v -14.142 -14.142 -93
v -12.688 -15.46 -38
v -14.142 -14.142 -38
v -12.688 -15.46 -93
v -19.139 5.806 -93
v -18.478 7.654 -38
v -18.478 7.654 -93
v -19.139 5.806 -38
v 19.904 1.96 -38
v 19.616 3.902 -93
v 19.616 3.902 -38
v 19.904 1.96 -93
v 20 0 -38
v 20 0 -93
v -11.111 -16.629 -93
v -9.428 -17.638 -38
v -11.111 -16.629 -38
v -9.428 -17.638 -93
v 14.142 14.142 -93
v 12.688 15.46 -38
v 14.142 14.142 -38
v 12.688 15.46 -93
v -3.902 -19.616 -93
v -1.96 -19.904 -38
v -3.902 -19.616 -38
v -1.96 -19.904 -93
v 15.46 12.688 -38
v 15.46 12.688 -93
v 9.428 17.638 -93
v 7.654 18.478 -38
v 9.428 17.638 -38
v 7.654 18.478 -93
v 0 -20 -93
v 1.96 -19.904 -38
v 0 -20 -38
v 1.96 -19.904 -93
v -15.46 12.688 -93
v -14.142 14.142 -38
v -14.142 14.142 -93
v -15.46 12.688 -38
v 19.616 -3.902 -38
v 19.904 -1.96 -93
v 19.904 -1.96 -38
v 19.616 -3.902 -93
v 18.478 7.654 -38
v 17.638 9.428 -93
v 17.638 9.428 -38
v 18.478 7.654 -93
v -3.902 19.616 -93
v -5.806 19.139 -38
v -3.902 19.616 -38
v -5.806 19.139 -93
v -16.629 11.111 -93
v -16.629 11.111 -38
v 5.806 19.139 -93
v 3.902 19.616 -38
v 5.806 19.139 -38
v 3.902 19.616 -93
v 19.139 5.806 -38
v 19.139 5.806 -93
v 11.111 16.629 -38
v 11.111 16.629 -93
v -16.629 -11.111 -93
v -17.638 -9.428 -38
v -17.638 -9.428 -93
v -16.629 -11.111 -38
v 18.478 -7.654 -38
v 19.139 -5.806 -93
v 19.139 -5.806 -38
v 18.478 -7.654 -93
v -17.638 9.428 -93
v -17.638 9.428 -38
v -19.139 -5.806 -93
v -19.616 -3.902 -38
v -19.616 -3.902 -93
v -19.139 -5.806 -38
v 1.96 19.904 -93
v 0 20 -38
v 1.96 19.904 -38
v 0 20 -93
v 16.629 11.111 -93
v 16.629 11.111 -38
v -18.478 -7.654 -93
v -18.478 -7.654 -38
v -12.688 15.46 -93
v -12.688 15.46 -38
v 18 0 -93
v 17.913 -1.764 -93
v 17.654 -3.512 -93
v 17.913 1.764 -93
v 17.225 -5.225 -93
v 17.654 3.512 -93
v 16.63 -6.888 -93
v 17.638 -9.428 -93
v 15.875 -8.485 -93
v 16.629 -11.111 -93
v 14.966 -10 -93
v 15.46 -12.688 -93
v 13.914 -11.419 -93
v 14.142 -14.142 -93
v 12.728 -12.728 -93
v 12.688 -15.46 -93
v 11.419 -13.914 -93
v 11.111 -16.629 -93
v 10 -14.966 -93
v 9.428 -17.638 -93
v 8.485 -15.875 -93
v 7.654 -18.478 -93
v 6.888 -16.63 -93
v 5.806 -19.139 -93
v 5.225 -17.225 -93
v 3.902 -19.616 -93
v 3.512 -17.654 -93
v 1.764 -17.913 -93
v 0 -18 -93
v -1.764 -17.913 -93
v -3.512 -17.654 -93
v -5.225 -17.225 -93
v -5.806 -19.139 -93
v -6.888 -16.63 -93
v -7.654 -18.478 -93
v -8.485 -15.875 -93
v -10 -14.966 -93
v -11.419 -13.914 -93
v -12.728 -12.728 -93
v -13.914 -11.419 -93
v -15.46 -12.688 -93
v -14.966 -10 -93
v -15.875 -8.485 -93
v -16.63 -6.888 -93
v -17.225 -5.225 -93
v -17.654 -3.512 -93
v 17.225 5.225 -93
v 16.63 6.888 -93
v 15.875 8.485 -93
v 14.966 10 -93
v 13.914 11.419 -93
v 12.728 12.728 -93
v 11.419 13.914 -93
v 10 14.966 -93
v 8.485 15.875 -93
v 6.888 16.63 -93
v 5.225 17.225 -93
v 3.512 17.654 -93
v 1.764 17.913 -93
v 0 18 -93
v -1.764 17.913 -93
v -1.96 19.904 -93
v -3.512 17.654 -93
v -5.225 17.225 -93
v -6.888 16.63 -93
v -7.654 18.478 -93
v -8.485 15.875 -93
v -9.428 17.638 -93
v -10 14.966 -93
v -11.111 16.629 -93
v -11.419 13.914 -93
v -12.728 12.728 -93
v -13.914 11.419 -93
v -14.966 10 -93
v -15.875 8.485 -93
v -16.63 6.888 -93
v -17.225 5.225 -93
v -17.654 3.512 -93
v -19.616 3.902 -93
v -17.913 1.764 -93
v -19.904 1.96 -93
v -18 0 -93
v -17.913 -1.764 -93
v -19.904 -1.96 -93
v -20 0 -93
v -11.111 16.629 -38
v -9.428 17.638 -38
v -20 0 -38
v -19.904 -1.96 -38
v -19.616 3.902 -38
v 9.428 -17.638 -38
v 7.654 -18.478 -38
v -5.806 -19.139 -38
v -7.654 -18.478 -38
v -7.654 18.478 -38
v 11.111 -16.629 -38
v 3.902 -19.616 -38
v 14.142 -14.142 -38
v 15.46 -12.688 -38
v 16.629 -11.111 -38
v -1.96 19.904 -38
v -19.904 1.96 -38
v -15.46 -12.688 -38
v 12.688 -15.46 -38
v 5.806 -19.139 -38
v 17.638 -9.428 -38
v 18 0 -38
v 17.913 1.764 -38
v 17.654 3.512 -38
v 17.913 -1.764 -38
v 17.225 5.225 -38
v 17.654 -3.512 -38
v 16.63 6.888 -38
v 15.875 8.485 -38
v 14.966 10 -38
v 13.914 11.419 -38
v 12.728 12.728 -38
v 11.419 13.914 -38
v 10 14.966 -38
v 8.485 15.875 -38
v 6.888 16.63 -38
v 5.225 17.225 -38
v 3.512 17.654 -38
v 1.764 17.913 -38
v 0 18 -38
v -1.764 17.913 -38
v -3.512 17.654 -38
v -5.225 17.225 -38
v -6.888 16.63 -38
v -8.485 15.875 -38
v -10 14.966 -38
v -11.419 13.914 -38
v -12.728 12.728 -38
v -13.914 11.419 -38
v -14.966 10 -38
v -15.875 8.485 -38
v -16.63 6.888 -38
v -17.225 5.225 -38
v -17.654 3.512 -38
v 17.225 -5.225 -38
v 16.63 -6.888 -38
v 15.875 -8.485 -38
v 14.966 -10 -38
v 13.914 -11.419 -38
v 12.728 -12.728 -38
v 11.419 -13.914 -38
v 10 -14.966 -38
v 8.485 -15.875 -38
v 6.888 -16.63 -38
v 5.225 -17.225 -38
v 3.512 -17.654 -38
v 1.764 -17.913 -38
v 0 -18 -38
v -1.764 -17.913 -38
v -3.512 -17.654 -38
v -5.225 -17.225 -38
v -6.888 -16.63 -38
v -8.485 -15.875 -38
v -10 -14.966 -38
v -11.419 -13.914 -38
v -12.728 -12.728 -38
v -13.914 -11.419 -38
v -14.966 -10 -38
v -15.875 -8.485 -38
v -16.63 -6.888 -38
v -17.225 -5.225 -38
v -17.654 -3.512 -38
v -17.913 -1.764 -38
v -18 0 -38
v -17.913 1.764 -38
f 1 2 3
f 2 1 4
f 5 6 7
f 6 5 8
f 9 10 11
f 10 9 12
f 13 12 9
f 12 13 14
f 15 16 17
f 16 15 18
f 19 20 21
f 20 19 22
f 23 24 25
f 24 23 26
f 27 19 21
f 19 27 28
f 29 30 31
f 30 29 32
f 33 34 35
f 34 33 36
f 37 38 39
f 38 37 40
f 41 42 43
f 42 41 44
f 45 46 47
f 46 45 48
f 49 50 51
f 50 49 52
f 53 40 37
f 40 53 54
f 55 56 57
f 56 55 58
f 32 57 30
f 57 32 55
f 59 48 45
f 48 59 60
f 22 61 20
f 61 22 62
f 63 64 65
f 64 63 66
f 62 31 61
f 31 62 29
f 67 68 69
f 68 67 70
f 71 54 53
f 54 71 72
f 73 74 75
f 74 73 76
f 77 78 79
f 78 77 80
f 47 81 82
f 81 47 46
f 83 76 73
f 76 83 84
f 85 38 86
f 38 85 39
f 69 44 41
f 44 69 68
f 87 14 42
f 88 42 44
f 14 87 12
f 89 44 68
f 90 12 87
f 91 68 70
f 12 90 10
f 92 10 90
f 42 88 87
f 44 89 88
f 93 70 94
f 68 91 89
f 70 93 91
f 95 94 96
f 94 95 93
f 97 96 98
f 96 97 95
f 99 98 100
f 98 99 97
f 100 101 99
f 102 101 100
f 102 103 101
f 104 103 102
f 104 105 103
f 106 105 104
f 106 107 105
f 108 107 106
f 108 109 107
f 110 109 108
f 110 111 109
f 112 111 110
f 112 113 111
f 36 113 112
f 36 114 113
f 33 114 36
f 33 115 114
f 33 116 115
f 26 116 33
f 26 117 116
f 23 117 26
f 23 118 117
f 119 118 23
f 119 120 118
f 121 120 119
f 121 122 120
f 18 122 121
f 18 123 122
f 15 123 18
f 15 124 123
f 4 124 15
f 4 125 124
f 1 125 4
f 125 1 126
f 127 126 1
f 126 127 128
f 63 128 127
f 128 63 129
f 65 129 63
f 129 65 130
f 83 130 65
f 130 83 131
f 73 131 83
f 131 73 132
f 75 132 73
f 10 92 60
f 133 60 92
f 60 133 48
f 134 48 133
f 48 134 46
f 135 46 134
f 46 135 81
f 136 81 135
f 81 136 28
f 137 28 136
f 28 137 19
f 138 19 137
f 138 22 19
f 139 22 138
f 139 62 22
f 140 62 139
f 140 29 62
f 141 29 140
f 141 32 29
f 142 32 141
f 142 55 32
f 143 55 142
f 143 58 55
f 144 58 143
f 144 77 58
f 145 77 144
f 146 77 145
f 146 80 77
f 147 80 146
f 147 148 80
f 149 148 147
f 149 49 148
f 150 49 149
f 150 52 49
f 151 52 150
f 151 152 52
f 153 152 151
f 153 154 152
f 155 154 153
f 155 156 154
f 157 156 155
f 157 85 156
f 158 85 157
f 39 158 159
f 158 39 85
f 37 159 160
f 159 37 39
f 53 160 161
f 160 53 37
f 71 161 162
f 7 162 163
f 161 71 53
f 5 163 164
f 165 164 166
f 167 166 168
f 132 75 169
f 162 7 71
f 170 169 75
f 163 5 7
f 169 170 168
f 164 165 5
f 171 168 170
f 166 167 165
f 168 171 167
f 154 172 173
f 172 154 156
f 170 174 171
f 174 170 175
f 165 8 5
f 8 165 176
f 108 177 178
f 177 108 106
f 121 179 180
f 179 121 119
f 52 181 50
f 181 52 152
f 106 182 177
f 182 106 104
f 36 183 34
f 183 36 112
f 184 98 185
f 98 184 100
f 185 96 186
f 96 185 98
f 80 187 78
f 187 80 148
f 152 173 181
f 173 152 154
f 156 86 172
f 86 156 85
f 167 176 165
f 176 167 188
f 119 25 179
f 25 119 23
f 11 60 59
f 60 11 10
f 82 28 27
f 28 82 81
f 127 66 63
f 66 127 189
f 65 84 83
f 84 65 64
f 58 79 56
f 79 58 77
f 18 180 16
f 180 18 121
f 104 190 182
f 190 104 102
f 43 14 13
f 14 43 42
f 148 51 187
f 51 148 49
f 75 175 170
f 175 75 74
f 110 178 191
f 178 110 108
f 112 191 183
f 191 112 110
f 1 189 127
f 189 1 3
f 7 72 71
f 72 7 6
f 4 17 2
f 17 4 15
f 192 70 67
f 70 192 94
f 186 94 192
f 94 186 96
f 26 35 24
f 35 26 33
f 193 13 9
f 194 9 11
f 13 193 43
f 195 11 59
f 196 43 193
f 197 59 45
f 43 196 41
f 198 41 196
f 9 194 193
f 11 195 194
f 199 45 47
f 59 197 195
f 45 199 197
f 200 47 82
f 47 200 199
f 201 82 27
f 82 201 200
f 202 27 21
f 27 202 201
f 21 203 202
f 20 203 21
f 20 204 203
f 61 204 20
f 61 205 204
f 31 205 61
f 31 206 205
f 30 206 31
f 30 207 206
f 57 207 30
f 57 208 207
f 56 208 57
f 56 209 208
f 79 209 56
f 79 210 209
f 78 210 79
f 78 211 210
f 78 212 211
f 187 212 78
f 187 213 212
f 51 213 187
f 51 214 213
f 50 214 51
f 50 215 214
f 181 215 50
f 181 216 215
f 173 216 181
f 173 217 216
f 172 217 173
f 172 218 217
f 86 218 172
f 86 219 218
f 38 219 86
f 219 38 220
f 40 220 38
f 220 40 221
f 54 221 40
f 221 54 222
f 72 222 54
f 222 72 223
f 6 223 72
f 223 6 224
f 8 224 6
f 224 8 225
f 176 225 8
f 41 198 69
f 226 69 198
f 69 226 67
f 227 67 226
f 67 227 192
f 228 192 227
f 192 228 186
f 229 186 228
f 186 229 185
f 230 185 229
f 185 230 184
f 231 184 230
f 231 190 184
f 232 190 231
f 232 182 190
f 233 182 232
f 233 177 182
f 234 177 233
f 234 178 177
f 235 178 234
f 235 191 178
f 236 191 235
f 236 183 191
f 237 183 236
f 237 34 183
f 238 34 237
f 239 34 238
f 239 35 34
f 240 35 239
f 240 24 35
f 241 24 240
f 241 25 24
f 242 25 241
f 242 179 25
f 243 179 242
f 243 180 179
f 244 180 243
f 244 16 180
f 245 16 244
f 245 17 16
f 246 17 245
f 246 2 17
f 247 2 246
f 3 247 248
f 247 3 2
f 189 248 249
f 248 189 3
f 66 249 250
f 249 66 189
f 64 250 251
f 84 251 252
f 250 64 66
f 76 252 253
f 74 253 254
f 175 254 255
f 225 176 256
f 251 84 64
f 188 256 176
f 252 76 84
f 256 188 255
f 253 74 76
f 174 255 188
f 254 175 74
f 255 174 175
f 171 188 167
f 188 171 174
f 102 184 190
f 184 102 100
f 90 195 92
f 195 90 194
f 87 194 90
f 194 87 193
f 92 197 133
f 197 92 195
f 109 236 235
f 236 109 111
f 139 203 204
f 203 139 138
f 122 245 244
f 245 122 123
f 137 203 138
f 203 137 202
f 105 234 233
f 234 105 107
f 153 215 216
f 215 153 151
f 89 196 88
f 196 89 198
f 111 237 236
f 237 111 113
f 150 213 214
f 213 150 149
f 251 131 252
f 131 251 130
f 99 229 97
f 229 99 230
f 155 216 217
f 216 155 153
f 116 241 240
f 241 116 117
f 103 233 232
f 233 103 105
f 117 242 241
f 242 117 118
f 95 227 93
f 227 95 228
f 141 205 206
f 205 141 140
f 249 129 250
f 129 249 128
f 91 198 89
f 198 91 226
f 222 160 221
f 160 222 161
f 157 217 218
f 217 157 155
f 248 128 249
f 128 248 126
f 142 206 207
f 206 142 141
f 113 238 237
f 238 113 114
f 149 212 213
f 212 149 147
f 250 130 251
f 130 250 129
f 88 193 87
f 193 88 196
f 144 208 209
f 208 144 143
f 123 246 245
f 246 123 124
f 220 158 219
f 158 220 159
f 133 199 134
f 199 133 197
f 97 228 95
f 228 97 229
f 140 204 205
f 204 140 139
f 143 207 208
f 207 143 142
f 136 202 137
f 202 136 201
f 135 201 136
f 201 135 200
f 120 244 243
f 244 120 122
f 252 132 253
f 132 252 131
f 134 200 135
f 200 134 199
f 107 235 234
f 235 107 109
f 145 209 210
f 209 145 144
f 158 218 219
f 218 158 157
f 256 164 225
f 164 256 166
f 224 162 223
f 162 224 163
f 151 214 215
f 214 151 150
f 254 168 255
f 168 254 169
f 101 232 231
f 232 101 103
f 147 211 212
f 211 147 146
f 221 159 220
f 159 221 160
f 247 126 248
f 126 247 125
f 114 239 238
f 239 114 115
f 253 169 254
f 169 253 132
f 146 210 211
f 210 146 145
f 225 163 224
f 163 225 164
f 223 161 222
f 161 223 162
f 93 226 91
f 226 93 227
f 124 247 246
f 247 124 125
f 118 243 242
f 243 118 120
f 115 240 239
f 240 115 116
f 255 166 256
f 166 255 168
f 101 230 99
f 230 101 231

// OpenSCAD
$fn=64;

//import("spiralbase.stl");
d=36;
h=55;

translate([0,0,-h-38])
difference() {
    cylinder(d = d+4, h = h);
    translate([0, 0, -0.5]) cylinder(d = d, h = h + 1);
}
//difference() {
//    cylinder(d = d+6, h = h);
//    translate([0, 0, -0.5]) cylinder(d = d, h = h + 1);
//}

//linear_extrude(10){
//    difference(){
//        circle(h=h,d=d+10);
//        circle(d=d,h=h);
//    }
//}
